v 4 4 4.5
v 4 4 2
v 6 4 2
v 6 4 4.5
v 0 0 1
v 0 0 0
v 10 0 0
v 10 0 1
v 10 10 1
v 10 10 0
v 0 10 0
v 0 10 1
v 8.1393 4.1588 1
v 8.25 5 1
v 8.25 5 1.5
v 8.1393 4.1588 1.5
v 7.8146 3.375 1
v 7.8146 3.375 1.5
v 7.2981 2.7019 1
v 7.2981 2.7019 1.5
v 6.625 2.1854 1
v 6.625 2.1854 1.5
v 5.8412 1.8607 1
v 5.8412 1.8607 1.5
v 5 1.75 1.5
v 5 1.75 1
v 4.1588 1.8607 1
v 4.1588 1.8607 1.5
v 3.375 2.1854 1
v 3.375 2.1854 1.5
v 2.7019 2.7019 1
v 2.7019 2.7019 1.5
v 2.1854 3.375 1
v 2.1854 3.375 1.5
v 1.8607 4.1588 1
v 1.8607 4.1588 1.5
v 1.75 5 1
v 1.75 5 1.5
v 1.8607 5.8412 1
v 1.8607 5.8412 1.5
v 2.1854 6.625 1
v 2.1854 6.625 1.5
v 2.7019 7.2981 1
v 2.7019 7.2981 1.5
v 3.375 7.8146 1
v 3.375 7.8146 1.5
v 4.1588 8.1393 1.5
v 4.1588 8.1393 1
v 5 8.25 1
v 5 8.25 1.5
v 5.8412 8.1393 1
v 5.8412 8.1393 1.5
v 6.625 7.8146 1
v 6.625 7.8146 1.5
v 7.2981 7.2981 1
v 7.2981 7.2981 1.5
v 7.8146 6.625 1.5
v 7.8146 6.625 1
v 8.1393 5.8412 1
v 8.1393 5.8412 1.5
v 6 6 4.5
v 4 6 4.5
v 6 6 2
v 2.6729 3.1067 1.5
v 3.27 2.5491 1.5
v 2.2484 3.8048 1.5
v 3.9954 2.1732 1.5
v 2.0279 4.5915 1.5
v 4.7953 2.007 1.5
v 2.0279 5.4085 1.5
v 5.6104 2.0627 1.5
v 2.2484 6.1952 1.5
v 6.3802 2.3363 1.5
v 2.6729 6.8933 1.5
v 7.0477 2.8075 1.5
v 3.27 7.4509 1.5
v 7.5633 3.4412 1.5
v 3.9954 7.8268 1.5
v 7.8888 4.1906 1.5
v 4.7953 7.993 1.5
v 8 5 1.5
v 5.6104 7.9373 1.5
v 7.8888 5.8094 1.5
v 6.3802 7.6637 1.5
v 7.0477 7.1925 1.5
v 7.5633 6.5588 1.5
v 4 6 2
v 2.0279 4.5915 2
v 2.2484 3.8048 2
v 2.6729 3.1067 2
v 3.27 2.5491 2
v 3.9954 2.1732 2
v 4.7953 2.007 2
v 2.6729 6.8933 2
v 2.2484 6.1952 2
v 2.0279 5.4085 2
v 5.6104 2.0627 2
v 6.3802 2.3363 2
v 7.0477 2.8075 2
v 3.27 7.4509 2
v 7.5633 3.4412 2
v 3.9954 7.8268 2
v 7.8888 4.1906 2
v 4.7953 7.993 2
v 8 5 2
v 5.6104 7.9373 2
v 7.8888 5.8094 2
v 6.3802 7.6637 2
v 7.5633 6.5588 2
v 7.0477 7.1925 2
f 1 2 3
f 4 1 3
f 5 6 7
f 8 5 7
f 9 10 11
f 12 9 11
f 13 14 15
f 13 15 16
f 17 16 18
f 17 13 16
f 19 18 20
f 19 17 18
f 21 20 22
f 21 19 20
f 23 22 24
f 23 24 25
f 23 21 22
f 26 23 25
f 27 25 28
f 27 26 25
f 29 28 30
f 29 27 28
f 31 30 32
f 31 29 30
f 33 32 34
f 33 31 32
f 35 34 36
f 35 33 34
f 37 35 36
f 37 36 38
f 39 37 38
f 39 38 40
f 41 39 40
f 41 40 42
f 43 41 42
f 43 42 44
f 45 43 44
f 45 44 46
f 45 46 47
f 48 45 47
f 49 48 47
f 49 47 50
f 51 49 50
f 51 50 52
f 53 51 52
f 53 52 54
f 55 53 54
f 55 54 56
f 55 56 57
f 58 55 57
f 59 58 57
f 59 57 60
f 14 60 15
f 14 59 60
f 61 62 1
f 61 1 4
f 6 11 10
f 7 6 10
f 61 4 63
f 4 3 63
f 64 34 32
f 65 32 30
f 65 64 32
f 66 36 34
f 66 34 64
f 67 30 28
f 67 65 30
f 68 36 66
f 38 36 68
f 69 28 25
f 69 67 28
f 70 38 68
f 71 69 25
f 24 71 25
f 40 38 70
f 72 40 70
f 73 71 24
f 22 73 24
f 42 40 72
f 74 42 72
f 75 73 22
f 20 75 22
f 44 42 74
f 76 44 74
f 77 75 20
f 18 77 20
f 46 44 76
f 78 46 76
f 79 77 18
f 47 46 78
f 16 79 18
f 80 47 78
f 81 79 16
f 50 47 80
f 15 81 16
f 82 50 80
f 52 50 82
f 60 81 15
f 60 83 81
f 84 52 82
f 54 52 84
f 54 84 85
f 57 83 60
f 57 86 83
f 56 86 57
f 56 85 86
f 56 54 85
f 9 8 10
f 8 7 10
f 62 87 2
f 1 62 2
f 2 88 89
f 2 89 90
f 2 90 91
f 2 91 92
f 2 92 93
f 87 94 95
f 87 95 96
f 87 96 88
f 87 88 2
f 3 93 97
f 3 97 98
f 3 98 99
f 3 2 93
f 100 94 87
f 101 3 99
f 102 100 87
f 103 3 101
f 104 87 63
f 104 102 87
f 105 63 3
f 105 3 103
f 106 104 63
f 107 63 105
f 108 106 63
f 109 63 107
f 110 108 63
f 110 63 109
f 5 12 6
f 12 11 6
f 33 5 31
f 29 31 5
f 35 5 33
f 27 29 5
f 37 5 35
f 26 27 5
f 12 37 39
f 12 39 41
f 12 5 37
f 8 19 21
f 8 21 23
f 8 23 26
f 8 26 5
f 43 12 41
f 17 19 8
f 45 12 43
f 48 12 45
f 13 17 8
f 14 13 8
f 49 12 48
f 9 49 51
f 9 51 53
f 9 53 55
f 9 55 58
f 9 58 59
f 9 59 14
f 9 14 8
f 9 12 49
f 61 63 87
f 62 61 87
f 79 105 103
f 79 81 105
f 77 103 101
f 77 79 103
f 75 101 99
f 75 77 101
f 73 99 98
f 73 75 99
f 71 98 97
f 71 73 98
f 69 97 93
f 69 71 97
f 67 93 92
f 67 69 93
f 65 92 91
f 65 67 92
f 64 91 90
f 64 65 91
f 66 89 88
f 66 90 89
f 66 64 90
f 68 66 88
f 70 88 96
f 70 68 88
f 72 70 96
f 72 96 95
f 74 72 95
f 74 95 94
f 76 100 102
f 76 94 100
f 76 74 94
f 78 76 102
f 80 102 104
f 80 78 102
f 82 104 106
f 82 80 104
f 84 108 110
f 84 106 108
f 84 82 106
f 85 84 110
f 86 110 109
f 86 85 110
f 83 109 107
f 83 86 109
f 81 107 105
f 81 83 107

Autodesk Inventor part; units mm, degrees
ref_plane "YZ Plane" through (0, 0, 0) normal (1, 0, 0) x (0, 1, 0)
ref_plane "XZ Plane" through (0, 0, 0) normal (0, 1, 0) x (-1, 0, 0)
ref_plane "XY Plane" through (0, 0, 0) normal (0, 0, 1) x (1, 0, 0)
sketch "Sketch1" plane through (0, 0, 0) normal (0, 0, 1) x (1, 0, 0)
  line L0 (0, 0) -> (10, 0)
  line L1 (10, 0) -> (10, 10)
  line L2 (10, 10) -> (0, 10)
  line L3 (0, 10) -> (0, 0)
  dimension "d0" = 10
  dimension "d1" = 10
extrude "Extrusion1" add sketch "Sketch1" along normal blind 1
sketch "Sketch2" plane through (0, 0, 1) normal (0, 0, 1) x (1, 0, 0)
  line L0 (10, 10) -> (0, 10) projected
  line L1 (5, 10) -> (5, 5)
  circle A0 centre (5, 5) radius 3.25
  point P0 (0, 0)
  dimension "d4" = 5
  dimension "d5" = 6.5
extrude "Extrusion2" add sketch "Sketch2" along normal blind 0.5
sketch "Sketch3" plane through (5, 5, 1.5) normal (0, 0, 1) x (1, 0, 0)
  circle A0 centre (0, 0) radius 3
  point P0 (-5, -5)
  dimension "d8" = 6
extrude "Extrusion3" add sketch "Sketch3" along normal blind 0.5
sketch "Sketch4" plane through (5, 5, 2) normal (0, 0, 1) x (1, 0, 0)
  line L0 (1, 0) -> (1, 1)
  line L1 (1, 1) -> (-1, 1)
  line L2 (-1, 1) -> (-1, -1)
  line L3 (-1, -1) -> (1, -1)
  line L4 (1, -1) -> (1, 0)
  point P0 (-5, -5)
  dimension "d12" = 1
  dimension "d13" = 2
  dimension "d14" = 2
extrude "Extrusion4" add sketch "Sketch4" along normal blind 2.5
sketch "Sketch5" plane through (0, 0, 1) normal (0, 0, 1) x (1, 0, 0)
  point P0 (0, 0)
sketch "Sketch6" plane through (5, 5, 4.5) normal (0, 0, 1) x (1, 0, 0)
  point P0 (-5, -5)
properties part number "BTN_2"
